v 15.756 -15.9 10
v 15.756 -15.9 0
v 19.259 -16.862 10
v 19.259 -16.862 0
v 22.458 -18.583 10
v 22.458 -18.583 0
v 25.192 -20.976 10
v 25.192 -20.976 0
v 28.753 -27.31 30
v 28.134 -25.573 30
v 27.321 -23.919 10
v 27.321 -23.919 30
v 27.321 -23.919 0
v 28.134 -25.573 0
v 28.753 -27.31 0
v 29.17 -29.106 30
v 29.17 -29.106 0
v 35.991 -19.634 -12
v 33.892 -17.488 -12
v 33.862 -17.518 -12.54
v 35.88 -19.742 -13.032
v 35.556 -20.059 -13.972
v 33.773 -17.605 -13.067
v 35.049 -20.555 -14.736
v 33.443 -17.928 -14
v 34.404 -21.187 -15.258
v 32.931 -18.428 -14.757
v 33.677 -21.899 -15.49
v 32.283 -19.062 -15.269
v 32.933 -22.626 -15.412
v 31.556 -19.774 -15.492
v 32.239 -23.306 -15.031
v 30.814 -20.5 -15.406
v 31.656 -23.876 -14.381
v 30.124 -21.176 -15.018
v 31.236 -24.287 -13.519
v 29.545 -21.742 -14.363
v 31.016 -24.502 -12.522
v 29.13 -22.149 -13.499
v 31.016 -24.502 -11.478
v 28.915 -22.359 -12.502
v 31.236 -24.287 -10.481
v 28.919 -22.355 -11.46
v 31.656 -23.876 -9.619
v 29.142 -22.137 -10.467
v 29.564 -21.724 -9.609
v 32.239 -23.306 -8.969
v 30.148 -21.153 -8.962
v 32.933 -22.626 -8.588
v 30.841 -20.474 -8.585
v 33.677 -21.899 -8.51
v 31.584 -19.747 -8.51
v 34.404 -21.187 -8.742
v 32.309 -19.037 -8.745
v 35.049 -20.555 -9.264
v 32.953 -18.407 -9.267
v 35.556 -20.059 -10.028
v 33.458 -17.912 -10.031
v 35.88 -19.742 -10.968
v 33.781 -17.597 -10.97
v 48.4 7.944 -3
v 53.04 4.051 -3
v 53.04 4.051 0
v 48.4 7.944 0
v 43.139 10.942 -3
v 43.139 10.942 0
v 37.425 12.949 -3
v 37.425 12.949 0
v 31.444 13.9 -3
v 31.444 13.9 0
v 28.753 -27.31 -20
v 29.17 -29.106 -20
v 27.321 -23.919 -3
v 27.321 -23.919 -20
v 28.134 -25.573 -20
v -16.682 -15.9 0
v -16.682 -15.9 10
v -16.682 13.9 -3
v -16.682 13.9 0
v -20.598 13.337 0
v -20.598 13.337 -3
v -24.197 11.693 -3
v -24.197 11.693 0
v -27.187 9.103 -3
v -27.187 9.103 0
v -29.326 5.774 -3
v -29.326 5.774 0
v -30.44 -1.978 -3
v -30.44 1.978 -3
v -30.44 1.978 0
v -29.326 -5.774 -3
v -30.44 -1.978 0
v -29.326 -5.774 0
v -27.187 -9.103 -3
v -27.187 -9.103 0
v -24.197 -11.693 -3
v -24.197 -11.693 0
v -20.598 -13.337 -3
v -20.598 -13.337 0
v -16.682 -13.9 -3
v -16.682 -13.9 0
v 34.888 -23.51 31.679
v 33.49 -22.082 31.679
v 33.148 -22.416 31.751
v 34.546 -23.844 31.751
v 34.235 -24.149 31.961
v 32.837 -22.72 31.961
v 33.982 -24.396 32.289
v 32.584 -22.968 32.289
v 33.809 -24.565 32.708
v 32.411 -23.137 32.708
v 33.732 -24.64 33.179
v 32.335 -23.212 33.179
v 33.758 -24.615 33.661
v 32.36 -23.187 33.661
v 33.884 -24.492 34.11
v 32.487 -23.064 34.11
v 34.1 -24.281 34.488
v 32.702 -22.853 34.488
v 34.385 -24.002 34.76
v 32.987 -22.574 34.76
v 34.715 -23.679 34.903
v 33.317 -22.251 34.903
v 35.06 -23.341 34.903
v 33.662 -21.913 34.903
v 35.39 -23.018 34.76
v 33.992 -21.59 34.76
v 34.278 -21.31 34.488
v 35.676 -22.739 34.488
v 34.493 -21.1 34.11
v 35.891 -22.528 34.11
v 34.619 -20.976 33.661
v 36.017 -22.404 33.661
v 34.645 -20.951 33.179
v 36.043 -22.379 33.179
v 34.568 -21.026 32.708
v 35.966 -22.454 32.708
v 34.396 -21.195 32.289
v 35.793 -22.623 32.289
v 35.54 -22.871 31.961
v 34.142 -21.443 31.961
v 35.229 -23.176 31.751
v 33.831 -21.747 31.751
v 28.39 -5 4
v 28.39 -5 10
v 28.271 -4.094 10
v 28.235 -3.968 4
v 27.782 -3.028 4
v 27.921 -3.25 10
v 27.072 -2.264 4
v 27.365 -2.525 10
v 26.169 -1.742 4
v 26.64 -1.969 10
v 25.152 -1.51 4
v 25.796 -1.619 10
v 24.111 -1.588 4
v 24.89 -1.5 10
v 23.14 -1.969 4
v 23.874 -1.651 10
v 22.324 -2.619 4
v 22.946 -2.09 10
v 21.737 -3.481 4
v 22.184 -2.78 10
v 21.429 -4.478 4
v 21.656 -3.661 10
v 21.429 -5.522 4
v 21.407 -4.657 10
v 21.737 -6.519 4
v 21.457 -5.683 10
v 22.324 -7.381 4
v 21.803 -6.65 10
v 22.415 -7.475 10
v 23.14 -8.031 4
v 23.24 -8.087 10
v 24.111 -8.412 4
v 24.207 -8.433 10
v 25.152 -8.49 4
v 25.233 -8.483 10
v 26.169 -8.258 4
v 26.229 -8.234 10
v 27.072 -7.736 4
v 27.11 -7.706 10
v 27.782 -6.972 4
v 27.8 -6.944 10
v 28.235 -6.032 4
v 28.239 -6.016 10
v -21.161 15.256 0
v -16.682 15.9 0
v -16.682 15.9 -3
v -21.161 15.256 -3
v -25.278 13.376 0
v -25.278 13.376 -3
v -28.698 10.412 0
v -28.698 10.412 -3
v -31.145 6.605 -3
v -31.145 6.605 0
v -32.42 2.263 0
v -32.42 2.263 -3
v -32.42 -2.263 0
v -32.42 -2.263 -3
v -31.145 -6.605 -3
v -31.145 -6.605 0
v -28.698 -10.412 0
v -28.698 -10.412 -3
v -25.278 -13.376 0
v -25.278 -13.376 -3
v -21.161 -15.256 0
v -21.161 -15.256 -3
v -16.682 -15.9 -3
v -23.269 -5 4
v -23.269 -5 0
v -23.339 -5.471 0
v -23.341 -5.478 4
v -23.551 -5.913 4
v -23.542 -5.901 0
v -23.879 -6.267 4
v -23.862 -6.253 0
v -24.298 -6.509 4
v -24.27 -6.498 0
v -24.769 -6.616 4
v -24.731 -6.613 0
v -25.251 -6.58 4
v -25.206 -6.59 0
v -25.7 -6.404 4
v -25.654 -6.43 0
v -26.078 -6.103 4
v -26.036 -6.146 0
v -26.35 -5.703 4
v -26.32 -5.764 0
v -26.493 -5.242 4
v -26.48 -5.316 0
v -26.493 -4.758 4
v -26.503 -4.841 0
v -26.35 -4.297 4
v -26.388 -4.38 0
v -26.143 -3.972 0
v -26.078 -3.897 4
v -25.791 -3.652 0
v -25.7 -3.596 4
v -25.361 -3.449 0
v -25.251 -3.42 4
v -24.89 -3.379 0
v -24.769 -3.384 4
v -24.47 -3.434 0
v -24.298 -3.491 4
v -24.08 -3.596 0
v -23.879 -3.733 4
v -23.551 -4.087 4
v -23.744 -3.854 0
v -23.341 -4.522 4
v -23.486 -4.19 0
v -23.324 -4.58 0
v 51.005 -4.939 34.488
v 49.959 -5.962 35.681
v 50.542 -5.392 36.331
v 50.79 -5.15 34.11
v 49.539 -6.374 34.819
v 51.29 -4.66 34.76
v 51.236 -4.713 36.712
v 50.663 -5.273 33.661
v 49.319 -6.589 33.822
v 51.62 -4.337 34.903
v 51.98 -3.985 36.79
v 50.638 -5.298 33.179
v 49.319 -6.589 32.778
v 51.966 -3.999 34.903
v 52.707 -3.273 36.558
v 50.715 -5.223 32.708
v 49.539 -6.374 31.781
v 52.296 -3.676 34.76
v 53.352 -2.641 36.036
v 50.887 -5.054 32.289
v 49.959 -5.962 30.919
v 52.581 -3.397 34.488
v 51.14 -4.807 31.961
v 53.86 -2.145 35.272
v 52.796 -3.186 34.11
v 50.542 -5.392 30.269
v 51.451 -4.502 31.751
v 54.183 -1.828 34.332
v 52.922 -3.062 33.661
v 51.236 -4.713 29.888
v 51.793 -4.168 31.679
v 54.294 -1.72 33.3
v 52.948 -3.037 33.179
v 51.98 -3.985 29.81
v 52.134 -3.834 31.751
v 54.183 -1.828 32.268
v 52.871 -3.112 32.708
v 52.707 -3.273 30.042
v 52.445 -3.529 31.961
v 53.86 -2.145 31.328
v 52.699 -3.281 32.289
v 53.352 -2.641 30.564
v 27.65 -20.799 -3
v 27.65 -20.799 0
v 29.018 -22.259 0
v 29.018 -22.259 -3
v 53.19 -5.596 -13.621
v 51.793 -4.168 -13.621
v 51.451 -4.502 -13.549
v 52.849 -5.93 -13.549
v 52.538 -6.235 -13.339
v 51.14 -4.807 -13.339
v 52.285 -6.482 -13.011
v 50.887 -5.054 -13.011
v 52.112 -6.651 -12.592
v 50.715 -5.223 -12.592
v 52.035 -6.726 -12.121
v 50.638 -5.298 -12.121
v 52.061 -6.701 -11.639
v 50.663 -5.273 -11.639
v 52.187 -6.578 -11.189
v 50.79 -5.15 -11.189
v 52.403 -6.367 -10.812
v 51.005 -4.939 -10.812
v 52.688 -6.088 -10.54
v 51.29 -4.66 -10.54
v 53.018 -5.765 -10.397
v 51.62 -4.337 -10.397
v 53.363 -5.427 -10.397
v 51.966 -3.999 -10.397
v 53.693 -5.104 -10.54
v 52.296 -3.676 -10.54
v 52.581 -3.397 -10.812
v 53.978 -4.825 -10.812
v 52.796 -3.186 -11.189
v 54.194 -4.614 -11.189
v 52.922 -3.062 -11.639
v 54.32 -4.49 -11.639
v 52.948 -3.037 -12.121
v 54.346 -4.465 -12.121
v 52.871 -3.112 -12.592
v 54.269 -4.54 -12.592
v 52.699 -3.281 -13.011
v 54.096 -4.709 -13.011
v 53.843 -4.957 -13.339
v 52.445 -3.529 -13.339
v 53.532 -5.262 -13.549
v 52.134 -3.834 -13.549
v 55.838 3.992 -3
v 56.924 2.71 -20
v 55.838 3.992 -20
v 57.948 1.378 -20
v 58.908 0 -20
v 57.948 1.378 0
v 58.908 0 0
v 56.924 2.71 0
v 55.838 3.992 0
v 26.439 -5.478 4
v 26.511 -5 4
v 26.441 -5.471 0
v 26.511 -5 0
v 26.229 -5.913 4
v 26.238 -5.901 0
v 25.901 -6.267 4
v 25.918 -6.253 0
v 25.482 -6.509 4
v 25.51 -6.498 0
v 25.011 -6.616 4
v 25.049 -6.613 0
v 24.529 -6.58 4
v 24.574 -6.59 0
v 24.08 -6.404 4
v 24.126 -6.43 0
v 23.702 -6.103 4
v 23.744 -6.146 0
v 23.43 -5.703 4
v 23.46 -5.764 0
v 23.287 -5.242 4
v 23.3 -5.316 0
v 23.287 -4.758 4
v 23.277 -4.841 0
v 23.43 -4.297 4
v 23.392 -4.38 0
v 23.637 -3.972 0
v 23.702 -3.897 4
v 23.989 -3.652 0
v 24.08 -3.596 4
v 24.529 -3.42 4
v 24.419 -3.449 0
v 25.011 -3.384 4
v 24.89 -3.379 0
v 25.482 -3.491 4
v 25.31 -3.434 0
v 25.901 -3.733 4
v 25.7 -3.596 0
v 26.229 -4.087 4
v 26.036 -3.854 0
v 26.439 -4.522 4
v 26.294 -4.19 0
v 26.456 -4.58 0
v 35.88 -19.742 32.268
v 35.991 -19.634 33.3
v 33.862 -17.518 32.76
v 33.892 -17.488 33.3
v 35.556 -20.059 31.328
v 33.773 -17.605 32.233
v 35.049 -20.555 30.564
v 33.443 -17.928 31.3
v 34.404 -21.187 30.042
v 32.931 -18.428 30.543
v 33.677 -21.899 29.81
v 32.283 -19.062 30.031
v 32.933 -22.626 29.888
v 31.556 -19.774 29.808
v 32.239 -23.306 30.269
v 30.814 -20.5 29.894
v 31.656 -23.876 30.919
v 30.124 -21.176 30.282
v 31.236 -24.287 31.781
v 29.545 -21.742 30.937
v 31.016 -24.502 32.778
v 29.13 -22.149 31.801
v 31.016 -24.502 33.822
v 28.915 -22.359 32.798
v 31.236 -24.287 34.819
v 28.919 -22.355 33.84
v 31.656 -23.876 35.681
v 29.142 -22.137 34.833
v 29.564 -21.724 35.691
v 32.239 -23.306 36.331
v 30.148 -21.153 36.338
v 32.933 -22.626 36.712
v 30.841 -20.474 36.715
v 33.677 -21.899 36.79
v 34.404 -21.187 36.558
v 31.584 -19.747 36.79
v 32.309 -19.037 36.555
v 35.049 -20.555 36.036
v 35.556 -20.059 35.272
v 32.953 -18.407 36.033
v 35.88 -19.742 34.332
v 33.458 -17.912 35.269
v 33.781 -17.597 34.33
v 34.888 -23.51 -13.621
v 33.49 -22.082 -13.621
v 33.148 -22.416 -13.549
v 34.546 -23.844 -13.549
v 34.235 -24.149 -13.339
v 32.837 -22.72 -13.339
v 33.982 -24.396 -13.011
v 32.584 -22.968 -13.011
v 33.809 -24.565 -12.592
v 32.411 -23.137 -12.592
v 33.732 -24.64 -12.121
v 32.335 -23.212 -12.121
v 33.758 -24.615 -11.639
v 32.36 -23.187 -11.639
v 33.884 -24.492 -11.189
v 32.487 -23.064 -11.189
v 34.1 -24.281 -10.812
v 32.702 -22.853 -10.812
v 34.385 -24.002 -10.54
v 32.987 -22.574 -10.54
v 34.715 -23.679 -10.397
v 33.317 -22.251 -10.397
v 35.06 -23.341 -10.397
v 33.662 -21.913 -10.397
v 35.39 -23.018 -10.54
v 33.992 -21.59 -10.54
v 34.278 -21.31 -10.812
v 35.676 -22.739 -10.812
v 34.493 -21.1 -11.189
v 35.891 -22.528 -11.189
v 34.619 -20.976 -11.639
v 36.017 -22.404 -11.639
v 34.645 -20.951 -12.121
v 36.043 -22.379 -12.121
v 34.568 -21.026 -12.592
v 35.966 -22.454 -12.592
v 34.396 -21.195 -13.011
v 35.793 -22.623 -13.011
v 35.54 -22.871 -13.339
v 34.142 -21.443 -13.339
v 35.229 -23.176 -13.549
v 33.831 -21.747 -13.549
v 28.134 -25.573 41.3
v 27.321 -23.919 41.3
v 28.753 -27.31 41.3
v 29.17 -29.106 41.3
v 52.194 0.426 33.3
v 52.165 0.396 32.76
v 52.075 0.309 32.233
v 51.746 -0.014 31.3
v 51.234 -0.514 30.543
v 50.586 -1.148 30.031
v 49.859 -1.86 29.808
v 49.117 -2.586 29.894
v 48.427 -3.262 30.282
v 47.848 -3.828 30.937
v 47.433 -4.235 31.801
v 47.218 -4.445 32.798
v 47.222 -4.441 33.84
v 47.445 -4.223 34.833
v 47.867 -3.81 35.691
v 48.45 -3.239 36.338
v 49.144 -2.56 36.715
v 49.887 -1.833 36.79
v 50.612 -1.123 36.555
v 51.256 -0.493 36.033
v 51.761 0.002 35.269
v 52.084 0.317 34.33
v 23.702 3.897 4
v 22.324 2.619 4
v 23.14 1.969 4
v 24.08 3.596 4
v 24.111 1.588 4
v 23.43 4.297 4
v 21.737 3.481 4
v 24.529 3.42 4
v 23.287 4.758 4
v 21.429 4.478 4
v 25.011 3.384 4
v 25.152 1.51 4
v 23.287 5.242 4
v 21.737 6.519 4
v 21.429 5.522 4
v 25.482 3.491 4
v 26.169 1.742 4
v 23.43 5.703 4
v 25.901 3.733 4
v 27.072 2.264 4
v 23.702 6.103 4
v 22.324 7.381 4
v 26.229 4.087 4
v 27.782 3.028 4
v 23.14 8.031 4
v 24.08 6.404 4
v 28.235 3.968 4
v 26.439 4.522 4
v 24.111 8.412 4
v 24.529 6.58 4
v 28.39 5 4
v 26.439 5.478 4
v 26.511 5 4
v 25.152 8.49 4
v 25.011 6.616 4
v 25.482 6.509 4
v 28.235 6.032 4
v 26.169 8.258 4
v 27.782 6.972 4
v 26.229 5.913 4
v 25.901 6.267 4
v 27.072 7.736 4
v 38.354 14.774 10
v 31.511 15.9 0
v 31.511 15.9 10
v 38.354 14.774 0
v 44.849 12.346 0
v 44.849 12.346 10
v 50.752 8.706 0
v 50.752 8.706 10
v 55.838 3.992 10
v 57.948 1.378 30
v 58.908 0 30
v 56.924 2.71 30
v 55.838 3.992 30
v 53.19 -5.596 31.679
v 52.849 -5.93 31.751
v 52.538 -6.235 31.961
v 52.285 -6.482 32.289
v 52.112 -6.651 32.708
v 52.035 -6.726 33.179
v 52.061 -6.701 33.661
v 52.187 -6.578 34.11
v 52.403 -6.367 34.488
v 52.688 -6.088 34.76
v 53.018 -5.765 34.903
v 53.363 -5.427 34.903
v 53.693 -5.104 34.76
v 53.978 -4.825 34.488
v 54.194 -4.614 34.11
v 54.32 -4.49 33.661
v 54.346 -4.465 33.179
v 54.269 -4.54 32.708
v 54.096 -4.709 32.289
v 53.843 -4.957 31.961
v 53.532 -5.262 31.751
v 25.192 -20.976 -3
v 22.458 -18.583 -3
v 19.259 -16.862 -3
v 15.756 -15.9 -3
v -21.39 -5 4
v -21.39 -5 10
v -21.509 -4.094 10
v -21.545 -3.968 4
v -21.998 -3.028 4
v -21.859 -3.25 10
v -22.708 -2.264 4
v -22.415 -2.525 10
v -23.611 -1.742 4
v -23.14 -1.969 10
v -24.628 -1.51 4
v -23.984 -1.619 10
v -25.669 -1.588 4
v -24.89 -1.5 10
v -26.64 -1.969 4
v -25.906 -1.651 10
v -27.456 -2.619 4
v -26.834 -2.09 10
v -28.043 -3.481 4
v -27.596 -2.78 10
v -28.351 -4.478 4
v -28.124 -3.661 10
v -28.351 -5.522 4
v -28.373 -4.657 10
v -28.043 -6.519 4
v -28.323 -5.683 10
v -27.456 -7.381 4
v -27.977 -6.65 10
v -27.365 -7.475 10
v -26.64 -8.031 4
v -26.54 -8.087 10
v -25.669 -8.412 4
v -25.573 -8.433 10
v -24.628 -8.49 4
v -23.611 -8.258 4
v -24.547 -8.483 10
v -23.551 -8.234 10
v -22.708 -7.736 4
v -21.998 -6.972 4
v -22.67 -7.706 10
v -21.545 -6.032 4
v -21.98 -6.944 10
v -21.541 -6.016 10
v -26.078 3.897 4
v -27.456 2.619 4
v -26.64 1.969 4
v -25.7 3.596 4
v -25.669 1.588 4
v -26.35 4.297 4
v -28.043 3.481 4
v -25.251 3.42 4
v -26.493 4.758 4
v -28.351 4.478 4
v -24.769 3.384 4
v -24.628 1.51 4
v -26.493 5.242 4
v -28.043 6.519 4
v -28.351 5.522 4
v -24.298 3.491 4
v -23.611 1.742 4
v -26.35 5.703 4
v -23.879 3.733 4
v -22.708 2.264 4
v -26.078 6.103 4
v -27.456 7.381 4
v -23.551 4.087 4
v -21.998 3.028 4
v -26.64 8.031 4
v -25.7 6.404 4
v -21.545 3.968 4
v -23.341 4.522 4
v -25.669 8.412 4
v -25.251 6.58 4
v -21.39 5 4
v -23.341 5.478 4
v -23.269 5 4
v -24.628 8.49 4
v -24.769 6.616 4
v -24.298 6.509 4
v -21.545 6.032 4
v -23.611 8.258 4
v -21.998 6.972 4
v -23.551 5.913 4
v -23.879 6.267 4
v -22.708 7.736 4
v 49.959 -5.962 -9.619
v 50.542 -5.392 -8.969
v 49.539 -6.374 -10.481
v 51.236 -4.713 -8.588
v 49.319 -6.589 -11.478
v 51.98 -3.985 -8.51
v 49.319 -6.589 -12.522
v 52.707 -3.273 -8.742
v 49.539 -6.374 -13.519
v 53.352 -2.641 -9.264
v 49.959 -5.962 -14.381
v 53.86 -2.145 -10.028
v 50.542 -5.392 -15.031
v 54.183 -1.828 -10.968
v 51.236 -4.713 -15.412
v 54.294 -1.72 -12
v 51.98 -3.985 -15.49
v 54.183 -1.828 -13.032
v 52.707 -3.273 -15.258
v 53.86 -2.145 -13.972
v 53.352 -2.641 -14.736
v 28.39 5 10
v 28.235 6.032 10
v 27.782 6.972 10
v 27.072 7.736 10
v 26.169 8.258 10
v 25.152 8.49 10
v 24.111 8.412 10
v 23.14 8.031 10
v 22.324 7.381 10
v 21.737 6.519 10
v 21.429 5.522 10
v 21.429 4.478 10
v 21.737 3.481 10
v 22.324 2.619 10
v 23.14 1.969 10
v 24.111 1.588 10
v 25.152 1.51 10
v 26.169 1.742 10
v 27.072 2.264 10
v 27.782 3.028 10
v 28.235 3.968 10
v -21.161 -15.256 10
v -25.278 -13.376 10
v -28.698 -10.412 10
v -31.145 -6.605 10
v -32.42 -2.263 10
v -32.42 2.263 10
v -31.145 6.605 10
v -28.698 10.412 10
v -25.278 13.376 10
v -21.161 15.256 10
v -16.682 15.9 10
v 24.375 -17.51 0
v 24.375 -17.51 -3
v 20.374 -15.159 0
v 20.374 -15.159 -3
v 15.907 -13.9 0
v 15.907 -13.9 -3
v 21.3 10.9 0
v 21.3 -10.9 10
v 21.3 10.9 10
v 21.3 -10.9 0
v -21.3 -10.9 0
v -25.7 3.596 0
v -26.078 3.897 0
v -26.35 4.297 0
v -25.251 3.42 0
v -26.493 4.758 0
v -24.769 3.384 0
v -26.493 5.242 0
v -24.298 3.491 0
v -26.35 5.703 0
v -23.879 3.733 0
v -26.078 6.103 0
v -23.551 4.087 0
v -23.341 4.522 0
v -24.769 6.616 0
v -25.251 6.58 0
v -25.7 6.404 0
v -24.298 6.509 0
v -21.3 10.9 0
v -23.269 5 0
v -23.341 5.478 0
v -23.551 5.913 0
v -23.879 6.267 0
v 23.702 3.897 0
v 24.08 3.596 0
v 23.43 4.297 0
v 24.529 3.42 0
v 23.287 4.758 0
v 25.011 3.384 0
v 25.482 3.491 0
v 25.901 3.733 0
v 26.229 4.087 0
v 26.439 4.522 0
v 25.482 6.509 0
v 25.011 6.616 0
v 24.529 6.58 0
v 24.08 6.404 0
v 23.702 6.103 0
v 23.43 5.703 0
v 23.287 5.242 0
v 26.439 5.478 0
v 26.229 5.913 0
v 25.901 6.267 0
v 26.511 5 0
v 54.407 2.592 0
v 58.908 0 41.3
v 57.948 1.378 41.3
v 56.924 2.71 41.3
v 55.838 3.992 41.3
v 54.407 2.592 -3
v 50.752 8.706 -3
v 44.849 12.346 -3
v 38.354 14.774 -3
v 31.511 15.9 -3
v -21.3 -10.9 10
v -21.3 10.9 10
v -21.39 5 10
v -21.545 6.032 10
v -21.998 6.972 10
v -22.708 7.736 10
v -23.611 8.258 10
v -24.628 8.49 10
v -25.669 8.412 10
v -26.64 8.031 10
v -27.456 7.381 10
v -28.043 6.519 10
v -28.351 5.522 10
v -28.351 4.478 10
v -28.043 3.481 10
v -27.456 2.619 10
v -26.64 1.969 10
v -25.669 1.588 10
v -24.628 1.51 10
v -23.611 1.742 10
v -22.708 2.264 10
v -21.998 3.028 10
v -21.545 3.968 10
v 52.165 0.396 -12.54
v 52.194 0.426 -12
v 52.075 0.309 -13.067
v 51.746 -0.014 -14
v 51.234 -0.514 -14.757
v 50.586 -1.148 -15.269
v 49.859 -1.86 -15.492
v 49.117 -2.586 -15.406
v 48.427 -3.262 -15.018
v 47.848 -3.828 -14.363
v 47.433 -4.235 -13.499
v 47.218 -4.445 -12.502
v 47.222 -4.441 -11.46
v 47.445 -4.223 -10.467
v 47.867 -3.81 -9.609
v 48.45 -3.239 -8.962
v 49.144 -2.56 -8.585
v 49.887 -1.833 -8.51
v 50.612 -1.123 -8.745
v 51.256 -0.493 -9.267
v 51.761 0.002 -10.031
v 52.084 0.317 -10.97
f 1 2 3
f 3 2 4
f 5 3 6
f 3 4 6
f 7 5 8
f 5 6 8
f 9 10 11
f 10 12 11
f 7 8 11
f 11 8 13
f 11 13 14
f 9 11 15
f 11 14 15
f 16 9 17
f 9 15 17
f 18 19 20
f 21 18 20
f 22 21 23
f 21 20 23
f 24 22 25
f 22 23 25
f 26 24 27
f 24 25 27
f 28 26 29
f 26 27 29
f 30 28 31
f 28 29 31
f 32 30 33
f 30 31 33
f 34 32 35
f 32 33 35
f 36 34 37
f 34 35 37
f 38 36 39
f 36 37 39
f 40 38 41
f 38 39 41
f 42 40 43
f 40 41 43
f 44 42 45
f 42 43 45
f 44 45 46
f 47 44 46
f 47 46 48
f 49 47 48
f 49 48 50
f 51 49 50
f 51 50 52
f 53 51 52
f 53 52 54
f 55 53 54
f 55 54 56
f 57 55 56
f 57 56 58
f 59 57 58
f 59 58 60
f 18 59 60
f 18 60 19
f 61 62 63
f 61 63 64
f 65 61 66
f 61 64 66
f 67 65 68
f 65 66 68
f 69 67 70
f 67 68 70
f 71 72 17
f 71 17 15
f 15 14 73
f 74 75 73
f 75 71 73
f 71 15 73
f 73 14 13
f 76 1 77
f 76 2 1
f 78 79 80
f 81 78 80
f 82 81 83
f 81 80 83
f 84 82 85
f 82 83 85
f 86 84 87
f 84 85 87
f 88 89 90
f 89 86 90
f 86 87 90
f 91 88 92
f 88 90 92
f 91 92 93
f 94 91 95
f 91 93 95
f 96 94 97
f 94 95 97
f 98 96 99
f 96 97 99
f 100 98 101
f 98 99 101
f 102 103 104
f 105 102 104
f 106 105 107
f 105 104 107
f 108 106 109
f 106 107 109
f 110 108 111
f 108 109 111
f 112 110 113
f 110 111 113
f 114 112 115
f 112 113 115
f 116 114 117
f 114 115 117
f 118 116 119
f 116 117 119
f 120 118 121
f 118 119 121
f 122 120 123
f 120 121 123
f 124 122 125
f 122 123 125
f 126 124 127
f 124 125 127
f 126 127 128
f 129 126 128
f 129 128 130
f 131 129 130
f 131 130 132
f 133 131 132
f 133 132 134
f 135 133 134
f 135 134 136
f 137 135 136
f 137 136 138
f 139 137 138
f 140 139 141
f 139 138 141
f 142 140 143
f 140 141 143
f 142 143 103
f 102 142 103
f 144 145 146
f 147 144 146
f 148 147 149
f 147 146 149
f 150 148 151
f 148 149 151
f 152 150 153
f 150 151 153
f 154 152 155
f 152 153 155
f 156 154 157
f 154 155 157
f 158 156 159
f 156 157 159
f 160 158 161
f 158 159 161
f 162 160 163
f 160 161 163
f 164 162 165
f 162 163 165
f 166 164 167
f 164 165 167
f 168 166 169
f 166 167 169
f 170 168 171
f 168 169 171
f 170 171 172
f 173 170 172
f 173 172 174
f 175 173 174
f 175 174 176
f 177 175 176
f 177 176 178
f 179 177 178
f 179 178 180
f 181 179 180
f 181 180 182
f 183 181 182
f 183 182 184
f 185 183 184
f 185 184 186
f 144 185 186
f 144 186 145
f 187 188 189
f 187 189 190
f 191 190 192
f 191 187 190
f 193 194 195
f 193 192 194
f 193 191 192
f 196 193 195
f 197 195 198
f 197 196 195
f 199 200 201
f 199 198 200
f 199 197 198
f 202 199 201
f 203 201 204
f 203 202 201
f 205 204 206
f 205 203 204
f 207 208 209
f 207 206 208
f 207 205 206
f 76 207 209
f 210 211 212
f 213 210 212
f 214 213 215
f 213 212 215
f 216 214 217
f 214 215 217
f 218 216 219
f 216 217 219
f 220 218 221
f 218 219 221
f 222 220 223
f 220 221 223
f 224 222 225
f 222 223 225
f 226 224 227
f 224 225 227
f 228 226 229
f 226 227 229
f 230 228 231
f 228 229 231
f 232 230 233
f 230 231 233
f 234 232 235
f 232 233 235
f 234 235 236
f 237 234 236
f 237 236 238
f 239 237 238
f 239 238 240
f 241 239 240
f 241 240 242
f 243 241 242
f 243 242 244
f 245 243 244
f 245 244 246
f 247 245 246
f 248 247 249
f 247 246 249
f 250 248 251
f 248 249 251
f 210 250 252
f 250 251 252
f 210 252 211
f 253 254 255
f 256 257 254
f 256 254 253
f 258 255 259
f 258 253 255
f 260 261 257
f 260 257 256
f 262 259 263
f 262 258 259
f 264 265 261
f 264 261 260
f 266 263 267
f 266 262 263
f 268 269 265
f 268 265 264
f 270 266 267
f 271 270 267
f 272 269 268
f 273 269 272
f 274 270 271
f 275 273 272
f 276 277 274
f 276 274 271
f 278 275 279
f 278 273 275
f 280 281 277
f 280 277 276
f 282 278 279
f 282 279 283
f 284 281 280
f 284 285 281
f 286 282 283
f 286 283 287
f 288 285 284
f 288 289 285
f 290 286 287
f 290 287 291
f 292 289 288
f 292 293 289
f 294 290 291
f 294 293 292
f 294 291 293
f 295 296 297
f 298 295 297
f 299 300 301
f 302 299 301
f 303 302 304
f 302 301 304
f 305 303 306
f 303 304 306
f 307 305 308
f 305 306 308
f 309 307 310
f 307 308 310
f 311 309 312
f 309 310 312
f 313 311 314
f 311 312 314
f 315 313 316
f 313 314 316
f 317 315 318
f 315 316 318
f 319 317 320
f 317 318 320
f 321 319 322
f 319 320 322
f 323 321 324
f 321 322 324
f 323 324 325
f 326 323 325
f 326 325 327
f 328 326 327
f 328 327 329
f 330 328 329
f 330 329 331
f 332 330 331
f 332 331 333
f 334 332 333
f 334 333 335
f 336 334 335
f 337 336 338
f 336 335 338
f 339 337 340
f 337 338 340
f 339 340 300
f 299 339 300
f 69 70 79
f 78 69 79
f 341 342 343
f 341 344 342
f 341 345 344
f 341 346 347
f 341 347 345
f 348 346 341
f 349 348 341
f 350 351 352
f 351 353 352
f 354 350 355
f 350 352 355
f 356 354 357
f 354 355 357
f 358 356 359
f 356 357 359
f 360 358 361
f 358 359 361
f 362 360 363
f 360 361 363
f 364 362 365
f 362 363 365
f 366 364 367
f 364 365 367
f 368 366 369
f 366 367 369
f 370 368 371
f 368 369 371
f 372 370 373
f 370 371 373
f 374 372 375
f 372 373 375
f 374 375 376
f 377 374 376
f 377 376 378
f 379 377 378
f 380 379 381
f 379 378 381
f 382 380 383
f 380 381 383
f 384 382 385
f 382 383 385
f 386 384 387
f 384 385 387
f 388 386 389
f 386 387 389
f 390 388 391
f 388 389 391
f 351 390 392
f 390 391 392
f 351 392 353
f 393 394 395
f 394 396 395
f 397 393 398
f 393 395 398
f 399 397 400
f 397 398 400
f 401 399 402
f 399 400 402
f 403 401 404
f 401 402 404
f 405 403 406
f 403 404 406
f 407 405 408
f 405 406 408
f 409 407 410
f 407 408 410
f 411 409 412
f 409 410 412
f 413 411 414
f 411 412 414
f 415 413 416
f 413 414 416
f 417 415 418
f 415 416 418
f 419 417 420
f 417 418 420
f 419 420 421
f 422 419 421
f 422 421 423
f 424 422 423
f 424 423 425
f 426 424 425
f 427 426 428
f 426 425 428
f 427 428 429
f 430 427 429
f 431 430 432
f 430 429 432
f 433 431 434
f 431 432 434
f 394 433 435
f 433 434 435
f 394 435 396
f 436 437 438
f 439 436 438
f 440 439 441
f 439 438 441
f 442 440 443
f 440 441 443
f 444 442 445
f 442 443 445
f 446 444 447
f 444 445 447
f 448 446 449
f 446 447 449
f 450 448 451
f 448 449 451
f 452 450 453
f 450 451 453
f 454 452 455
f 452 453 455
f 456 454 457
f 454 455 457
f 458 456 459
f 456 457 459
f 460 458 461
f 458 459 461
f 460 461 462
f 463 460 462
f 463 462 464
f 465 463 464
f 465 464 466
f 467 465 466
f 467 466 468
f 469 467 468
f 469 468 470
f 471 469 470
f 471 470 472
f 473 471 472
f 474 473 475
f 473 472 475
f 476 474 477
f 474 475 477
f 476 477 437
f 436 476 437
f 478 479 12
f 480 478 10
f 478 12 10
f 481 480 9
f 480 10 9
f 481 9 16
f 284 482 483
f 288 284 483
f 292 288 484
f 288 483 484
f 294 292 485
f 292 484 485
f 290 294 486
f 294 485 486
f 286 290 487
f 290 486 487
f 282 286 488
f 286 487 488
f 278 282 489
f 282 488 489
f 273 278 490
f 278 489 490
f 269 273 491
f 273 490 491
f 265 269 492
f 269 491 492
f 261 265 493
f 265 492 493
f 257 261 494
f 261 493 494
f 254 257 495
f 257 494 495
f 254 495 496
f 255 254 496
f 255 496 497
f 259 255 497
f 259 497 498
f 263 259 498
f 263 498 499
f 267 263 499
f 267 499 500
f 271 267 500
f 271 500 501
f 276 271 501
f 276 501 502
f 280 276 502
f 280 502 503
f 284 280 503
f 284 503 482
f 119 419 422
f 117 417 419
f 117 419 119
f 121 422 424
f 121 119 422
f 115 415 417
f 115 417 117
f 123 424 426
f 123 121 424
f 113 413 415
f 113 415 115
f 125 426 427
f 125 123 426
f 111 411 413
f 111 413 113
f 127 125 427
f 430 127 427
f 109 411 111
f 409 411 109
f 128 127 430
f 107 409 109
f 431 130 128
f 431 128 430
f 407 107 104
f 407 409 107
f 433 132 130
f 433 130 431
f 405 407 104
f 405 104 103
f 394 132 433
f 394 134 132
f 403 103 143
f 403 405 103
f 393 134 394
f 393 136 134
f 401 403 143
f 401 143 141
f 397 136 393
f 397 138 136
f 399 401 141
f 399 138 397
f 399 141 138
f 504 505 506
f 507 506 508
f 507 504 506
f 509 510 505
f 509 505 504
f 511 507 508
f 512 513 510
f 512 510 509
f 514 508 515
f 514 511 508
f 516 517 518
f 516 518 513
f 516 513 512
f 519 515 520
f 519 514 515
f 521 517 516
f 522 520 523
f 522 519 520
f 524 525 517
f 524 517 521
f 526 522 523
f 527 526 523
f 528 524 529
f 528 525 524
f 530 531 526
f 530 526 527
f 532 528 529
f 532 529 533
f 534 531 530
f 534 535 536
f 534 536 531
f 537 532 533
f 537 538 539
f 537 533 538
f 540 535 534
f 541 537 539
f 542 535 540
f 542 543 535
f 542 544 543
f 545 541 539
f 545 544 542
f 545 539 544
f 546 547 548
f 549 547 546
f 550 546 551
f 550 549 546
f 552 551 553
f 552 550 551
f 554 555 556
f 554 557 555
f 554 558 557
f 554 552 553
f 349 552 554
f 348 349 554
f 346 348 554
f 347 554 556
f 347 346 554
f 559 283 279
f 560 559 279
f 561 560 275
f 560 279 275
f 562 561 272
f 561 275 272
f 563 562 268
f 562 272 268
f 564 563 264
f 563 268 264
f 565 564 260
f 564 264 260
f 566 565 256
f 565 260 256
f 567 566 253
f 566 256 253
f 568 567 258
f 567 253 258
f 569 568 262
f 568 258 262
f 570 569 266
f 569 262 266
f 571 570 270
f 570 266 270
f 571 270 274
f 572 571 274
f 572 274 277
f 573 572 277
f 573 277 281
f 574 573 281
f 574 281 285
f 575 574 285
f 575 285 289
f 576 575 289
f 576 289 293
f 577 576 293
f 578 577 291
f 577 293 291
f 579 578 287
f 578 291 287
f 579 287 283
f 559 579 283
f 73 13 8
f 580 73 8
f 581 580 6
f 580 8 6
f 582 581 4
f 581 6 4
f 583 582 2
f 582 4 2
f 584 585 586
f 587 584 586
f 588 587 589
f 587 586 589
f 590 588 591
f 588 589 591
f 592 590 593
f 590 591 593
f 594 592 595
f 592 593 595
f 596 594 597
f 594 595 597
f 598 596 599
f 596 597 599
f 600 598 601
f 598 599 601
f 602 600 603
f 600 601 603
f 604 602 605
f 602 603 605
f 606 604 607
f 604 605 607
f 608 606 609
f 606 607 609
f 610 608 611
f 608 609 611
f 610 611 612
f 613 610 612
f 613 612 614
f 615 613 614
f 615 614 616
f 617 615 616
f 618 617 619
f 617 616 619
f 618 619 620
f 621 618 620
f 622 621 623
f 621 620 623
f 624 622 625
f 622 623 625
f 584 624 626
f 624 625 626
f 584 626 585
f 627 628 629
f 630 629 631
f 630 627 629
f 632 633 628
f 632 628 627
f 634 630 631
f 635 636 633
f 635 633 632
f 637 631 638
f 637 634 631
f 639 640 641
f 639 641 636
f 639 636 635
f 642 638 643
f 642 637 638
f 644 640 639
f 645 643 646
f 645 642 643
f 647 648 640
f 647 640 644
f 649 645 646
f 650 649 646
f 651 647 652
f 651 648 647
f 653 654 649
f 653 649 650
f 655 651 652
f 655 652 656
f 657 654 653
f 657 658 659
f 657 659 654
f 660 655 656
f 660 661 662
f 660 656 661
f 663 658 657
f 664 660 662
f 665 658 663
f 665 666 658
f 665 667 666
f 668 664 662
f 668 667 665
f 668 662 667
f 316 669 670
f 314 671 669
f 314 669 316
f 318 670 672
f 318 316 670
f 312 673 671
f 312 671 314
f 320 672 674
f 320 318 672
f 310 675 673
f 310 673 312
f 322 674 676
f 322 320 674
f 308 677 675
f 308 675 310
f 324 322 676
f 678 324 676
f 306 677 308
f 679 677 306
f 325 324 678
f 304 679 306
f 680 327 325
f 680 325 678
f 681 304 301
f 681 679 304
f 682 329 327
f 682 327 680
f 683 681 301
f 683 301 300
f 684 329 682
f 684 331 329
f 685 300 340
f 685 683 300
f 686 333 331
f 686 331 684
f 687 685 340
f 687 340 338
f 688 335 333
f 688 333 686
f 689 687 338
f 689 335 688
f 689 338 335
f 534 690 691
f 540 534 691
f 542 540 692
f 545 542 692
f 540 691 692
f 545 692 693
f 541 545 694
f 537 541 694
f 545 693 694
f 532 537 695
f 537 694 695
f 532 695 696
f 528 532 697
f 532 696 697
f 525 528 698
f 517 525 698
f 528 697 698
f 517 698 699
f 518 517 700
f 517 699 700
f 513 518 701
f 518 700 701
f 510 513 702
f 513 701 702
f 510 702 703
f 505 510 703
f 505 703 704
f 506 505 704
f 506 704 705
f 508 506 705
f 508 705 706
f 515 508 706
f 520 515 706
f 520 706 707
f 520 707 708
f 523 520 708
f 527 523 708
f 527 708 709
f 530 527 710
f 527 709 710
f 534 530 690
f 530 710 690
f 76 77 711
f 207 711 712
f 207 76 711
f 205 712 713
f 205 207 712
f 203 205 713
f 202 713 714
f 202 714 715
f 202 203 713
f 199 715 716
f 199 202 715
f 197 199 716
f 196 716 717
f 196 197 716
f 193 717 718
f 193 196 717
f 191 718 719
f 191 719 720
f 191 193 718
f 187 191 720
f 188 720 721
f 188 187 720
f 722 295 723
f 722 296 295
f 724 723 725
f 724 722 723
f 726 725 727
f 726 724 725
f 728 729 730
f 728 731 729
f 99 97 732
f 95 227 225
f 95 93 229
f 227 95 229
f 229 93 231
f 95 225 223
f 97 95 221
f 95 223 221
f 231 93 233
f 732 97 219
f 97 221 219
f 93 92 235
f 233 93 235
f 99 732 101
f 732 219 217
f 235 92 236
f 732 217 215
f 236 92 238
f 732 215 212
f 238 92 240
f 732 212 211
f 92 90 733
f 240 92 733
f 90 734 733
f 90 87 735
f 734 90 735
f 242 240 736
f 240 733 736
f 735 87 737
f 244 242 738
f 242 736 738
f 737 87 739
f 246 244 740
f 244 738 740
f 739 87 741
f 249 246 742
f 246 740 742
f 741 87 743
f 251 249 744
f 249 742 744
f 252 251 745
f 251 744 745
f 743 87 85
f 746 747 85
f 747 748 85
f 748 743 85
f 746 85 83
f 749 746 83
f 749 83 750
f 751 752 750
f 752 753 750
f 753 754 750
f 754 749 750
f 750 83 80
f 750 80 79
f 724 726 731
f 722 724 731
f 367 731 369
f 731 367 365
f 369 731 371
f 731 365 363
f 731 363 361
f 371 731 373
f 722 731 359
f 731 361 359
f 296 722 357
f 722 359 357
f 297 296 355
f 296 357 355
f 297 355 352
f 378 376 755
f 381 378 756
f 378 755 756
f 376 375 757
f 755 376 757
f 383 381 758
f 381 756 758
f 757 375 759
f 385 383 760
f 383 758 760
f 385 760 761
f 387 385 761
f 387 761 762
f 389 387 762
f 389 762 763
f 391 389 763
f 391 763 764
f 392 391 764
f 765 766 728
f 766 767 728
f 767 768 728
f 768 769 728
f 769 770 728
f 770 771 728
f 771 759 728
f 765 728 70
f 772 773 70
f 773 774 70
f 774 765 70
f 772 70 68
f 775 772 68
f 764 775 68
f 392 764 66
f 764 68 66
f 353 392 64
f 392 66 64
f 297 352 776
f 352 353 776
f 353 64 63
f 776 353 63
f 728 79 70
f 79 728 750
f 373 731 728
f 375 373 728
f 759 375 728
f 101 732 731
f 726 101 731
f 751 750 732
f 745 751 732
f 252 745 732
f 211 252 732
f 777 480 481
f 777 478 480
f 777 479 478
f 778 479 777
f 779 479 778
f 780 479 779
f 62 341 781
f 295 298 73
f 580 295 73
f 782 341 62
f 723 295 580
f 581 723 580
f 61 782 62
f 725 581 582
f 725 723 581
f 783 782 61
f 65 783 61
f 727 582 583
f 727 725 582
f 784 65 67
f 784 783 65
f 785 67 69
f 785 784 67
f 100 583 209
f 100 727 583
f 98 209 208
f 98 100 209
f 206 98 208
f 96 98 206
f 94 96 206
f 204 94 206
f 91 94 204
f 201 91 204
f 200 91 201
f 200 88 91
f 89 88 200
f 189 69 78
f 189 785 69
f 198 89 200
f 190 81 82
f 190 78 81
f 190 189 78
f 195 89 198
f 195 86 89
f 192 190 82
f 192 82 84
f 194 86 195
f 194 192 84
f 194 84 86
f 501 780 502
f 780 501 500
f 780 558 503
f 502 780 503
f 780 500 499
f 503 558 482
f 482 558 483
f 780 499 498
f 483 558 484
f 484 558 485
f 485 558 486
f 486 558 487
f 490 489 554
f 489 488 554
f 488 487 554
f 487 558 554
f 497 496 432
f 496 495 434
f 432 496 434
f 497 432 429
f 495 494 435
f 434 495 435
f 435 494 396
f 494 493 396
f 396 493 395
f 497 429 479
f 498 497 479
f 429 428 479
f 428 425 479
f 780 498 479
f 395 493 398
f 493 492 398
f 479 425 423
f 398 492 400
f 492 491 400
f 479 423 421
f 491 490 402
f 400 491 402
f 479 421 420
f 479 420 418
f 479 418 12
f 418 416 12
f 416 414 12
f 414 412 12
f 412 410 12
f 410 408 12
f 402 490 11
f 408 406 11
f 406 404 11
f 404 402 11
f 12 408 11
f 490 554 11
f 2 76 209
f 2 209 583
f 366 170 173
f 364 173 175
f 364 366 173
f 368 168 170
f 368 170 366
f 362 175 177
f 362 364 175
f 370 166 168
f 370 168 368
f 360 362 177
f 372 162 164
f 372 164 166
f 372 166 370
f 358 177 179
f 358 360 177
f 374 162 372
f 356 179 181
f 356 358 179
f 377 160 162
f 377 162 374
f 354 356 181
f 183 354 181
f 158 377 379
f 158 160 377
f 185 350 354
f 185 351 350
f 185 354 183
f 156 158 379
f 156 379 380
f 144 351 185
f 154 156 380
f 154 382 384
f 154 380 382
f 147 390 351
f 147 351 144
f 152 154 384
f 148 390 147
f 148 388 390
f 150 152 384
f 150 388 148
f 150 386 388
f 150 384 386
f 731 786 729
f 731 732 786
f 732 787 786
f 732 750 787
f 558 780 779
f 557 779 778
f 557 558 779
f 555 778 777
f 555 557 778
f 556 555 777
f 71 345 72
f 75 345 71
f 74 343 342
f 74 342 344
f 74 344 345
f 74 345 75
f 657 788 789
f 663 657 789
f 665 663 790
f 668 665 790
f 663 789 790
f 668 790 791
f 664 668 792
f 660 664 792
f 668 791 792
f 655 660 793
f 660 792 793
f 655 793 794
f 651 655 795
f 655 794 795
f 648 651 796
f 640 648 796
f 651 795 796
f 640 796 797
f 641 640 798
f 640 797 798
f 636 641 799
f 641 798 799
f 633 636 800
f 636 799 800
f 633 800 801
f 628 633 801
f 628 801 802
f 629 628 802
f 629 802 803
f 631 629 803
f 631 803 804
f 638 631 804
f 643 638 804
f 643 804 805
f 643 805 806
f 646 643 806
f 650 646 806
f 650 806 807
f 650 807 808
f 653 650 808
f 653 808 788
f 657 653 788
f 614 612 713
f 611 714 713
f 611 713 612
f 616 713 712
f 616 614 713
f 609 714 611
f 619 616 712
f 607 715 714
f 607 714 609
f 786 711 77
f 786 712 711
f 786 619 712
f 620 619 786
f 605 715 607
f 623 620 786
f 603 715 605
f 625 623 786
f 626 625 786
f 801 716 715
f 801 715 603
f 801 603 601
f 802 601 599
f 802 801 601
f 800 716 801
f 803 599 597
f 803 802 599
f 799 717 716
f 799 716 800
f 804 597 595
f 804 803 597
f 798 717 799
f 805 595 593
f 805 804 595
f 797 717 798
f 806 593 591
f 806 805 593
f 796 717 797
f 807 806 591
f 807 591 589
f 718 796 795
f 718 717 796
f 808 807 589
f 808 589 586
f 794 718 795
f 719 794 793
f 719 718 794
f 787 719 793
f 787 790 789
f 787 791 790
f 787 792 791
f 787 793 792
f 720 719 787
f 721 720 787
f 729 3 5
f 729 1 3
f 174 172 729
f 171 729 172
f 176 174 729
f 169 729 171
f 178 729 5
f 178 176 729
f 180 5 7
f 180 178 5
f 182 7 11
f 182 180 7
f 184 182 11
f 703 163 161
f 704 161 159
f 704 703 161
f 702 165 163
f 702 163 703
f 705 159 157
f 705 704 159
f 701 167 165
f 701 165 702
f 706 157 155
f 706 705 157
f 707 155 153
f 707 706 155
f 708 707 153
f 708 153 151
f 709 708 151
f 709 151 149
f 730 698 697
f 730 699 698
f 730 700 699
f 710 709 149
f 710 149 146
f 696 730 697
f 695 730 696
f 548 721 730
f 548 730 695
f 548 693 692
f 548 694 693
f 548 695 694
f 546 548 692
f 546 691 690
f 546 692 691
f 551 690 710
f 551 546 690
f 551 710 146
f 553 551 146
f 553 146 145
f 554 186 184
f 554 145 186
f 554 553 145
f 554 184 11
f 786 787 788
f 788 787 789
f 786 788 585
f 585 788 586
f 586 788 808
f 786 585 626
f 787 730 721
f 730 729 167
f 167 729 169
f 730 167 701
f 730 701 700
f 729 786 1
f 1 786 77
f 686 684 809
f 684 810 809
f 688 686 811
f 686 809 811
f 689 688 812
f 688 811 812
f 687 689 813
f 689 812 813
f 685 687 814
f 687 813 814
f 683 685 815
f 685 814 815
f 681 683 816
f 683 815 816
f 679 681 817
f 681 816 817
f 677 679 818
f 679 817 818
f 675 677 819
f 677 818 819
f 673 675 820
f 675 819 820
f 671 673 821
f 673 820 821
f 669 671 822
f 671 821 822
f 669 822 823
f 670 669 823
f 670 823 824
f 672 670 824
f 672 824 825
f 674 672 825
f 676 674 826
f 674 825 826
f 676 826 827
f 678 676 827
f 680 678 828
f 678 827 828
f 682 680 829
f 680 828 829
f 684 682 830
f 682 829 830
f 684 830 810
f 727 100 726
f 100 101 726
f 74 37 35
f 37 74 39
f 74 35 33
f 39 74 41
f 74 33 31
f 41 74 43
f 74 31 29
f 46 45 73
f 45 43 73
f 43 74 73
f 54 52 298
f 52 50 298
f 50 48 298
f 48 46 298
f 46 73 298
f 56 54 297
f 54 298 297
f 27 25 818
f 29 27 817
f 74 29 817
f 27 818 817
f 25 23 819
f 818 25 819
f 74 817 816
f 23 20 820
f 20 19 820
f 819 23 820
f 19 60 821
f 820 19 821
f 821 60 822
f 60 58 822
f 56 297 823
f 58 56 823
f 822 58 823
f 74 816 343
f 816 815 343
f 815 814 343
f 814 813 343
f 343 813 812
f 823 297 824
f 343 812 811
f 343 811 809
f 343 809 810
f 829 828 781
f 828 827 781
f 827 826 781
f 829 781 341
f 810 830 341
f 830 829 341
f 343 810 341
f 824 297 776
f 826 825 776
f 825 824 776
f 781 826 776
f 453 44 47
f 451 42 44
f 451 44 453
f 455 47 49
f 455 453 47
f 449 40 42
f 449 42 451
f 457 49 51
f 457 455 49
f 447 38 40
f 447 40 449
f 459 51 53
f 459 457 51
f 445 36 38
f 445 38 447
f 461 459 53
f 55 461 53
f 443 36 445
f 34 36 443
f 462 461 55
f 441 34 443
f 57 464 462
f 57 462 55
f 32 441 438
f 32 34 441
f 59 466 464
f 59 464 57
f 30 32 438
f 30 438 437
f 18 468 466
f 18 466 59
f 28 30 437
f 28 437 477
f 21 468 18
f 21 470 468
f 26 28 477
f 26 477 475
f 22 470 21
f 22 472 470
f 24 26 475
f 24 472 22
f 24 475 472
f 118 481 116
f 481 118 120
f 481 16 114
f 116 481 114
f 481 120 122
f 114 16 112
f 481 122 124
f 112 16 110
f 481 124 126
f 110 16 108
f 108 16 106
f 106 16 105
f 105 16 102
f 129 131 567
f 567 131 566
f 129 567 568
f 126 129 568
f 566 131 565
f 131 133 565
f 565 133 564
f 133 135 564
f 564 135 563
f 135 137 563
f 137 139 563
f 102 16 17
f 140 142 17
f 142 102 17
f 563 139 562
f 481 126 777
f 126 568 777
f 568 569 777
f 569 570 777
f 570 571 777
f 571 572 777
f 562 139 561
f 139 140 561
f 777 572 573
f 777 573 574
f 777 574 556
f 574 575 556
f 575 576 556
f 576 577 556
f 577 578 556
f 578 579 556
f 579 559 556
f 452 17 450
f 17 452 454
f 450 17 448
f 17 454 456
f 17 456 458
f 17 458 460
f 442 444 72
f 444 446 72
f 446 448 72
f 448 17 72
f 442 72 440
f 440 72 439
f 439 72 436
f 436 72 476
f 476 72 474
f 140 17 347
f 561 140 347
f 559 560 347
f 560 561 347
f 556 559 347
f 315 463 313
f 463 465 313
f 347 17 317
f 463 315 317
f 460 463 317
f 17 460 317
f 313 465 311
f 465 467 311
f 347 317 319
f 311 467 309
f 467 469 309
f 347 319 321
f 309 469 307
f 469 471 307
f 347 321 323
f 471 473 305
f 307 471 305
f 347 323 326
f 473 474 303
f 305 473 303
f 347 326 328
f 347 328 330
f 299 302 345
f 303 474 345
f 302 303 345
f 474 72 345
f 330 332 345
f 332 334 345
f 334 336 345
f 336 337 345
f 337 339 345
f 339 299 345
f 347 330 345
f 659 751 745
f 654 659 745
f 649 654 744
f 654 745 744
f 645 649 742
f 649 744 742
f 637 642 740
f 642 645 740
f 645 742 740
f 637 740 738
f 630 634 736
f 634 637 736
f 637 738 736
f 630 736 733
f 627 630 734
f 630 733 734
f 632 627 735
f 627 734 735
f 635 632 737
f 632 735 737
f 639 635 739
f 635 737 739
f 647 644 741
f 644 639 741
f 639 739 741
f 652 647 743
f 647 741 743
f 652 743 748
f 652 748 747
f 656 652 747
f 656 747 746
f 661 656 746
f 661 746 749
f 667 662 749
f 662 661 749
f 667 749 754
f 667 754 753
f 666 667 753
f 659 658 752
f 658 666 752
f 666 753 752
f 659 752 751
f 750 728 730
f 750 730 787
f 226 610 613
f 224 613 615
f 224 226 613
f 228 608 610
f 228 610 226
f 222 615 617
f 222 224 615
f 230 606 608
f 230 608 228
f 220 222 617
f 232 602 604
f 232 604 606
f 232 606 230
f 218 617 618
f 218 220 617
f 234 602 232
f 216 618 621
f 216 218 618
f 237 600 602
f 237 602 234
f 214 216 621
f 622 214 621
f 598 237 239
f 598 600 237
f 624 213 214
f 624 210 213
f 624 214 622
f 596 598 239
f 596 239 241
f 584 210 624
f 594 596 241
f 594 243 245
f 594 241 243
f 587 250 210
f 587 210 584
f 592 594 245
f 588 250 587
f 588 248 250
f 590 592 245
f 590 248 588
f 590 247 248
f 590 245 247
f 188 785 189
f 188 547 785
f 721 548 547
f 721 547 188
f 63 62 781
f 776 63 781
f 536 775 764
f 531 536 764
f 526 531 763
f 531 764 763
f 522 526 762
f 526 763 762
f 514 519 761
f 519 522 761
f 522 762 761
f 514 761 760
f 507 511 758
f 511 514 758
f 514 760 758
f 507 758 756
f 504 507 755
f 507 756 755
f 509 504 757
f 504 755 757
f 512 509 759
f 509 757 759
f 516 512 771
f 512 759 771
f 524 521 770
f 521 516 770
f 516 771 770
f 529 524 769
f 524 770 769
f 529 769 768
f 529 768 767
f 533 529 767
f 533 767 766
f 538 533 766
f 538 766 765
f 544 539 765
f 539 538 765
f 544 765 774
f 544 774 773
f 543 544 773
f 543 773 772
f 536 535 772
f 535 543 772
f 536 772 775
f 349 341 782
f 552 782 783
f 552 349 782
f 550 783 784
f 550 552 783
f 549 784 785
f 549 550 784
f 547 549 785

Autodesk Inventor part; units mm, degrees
ref_plane "YZ Plane" through (0, 0, 0) normal (1, 0, 0) x (0, 1, 0)
ref_plane "XZ Plane" through (0, 0, 0) normal (0, 1, 0) x (-1, 0, 0)
ref_plane "XY Plane" through (0, 0, 0) normal (0, 0, 1) x (1, 0, 0)
sketch "Szkic1" plane through (0, 0, 0) normal (0, 0, 1) x (1, 0, 0)
  line L0 (20.3, -9.9) -> (-20.3, -9.9)
  line L1 (-20.3, -9.9) -> (-20.3, 9.9)
  line L2 (-20.3, 9.9) -> (20.3, 9.9)
  line L3 (20.3, 9.9) -> (20.3, -9.9)
  line L4 (20.3, -9.9) -> (-20.3, 9.9) construction
  line L5 (-20.3, -9.9) -> (20.3, 9.9) construction
  line L6 (21.3, 10.9) -> (-21.3, 10.9)
  line L7 (-21.3, 10.9) -> (-21.3, -10.9)
  line L8 (-21.3, -10.9) -> (21.3, -10.9)
  line L9 (21.3, -10.9) -> (21.3, 10.9)
  line L10 (0, 0) -> (24.89, 0)
  line L11 (24.89, 0) -> (24.89, 5)
  line L12 (24.89, 5) -> (24.89, -5)
  line L13 (0, 0) -> (-24.89, 0)
  line L14 (-24.89, 5) -> (-24.89, 0)
  line L15 (-24.89, 0) -> (-24.89, -5)
  circle A0 centre (-24.89, 5) radius 1.621
  circle A1 centre (-24.89, -5) radius 1.621
  circle A2 centre (24.89, -5) radius 1.621
  circle A3 centre (24.89, 5) radius 1.621
  line L16 (-26.511, 5) -> (-31.511, 5)
  line L17 (26.511, 5) -> (31.511, 5)
  line L18 (0, 10.9) -> (0, 15.9)
  line L19 (0, 15.9) -> (-16.6819, 15.9)
  line L20 (0, -10.9) -> (0, -15.9)
  line L21 (0, -15.9) -> (-16.6819, -15.9)
  line L22 (-31.511, -5.7364) -> (-31.511, 5.7364)
  line L23 (0, 15.9) -> (31.511, 15.9)
  line L24 (31.511, 15.9) -> (31.511, -15.9)
  line L25 (0, -15.9) -> (31.511, -15.9)
  arc A4 (58.9078, 0) -> (31.511, 15.9) centre (29.1703, -19.6864) ccw
  arc A5 (29.1703, -29.1056) -> (15.7555, -15.9) centre (13.2559, -31.8556) ccw
  line L26 (29.1703, -29.1056) -> (58.9078, 0)
  circle A6 centre (-16.6819, 0) radius 15.9
  arc A7 (-32.5353, -15.867) -> (-31.511, -15.9) centre (-31.511, 0) ccw
  point P0 (58.9078, 0)
  dimension "d10" = 3.242
  dimension "d13" = 3.242
  dimension "d0" = 40.6
  dimension "d1" = 19.8
  dimension "d2" = 1
  dimension "d3" = 42.6
  dimension "d4" = 24.89
  dimension "d5" = 5
  dimension "d6" = 10
  dimension "d7" = 24.89
  dimension "d8" = 5
  dimension "d9" = 5
  dimension "d11" = 3.242
  dimension "d12" = 3.242
  dimension "d14" = 5
  dimension "d15" = 5
  dimension "d16" = 5
  dimension "d17" = 5
  dimension "d18" = 6.621
  dimension "d19" = 63.022
  dimension "d20" = 10.9
  dimension "d21" = 0
extrude "Wyciągnięcie proste1" add sketch "Szkic1" along normal blind 10 contours A6 L22 L16 A0 L14 L13 L7 L8 | L8 L20 L21 A6 | L10 L11 A3 L17 L24 L25 L20 L8 L9 | L9 L6 L18 L23 L24 L17 A3 L11 L10 | L13 L14 A0 L16 L22 A6 L6 L7 | A6 L22 | A6 L19 L18 L6 | L25 L24 A4 L26 A5
sketch "Szkic2" plane through (0, 0, 10) normal (0, 0, 1) x (1, 0, 0)
  arc A0 (29.1703, -29.1056) -> (15.7555, -15.9) centre (13.2559, -31.8556) ccw projected
  line L0 (29.1703, -29.1056) -> (58.9078, 0) projected
  arc A1 (58.9078, 0) -> (31.511, 15.9) centre (29.1703, -19.6864) ccw projected
  line L1 (29.1703, -29.1056) -> (58.9078, 0) projected
  arc A2 (29.1703, -29.1056) -> (15.7555, -15.9) centre (13.2559, -31.8556) ccw projected
  line L2 (27.3214, -23.9188) -> (55.8385, 3.9923)
  line L3 (31.511, 15.9) -> (-16.6819, 15.9) projected
  arc A3 (-16.6819, 15.9) -> (-16.6819, -15.9) centre (-16.6819, 0) ccw projected
  line L4 (-16.6819, -15.9) -> (15.7555, -15.9) projected
  point P0 (0, 0)
  dimension "d24" = 5
extrude "Wyciągnięcie proste2" add sketch "Szkic2" along normal blind 20 contours A0 L2 A1 L0
sketch "Szkic3" plane through (0, 0, 0) normal (0, 0, -1) x (-1, 0, 0)
  line L0 (-27.3214, -23.9188) -> (-55.8385, 3.9923) projected
  line L1 (-29.1703, -29.1056) -> (-58.9078, 0) projected
  arc A0 (-15.7555, -15.9) -> (-29.1703, -29.1056) centre (-13.2559, -31.8556) ccw projected
  arc A1 (-31.511, 15.9) -> (-58.9078, 0) centre (-29.1703, -19.6864) ccw projected
  line L2 (-29.1703, -29.1056) -> (-58.9078, 0) projected
  line L3 (16.6819, -15.9) -> (-15.7555, -15.9) projected
  arc A2 (16.6819, -15.9) -> (16.6819, 15.9) centre (16.6819, 0) ccw projected
  line L4 (-31.511, 15.9) -> (16.6819, 15.9) projected
  point P0 (0, 0)
  point P1 (-55.8385, 3.9923)
extrude "Wyciągnięcie proste3" add sketch "Szkic3" along normal blind 20 contours A0 L1 A1 L0
sketch "Szkic9" plane through (0, 0, 30) normal (0, 0, 1) x (1, 0, 0)
  arc A0 (29.1703, -29.1056) -> (27.3214, -23.9188) centre (13.2559, -31.8556) ccw projected
  line L0 (29.1703, -29.1056) -> (58.9078, 0) projected
  arc A1 (58.9078, 0) -> (55.8385, 3.9923) centre (29.1703, -19.6864) ccw projected
  line L1 (55.8385, 3.9923) -> (27.3214, -23.9188) projected
  point P0 (0, 0)
extrude "Wyciągnięcie proste5" add sketch "Szkic9" along normal blind 11.3
sketch "Szkic10" plane through (58.9078, 0, -20) normal (0.6995, -0.7147, 0) x (0.7147, 0.6995, 0)
  line L0 (-41.6107, 0) -> (-41.6107, 61.3) projected
  line L1 (0, 0) -> (-41.6107, 0) projected
  line L2 (0, 0) -> (0, 61.3) projected
  line L3 (-41.6107, 61.3) -> (0, 61.3) projected
  point P0 (-42.099, 20)
  point P1 (-33.6107, 8)
  point P2 (-8, 8)
  point P3 (-33.6107, 53.3)
  point P4 (-8, 53.3)
  dimension "d60" = 8
  dimension "d61" = 8
  dimension "d62" = 8
  dimension "d63" = 8
  dimension "d64" = 8
  dimension "d65" = 8
  dimension "d66" = 8
  dimension "d67" = 8
hole "Otwór2" at (34.8876, -23.5098, -12) at (53.1905, -5.5958, -12) at (34.8876, -23.5098, 33.3) at (53.1905, -5.5958, 33.3) direction (-0.6995, 0.7147, 0) diameter 3.242 end through all thread size "M4x0.7" designation "M4" class "6H" standard "GB Metric profile"
sketch "Szkic12" plane through (55.8385, 3.9923, 0) normal (-0.6995, 0.7147, 0) x (0.7147, 0.6995, 0)
  circle A0 centre (-34.2097, 12) radius 1.621 projected
  circle A1 centre (-8.599, 12) radius 1.621 projected
  line L0 (0, 0) -> (-39.9031, 0) projected
  line L1 (0, 0) -> (0, 20) projected
  line L2 (-39.9031, 20) -> (0, 20) projected
  line L3 (-39.9031, 0) -> (-39.9031, 20) projected
  circle A2 centre (-34.2097, -33.3) radius 1.621 projected
  circle A3 centre (-8.599, -33.3) radius 1.621 projected
  line L4 (-39.9031, -10) -> (0, -10) projected
  line L5 (-39.9031, -10) -> (-39.9031, -41.3) projected
  line L6 (0, -41.3) -> (-39.9031, -41.3) projected
  line L7 (0, -10) -> (0, -41.3) projected
  circle A4 centre (-8.599, 12) radius 1.621 projected
  circle A5 centre (-8.599, 12) radius 3.5
  circle A6 centre (-34.2097, 12) radius 3.5
  circle A7 centre (-34.2097, -33.3) radius 3.5
  circle A8 centre (-8.599, -33.3) radius 3.5
  point P0 (-42.698, 0)
  dimension "d77" = 7
  dimension "d78" = 7
  dimension "d79" = 7
  dimension "d80" = 7
extrude "Wyciągnięcie proste6" cut sketch "Szkic12" against normal blind 3 contours A0 | A1 | A2 | A3 | A5 | A6 | A7 | A8
sketch "Szkic15" plane through (0, 0, 0) normal (0, 0, -1) x (-1, 0, 0)
  line L0 (-55.8385, 3.9923) -> (-27.3214, -23.9188) projected
  arc A0 (-15.7555, -15.9) -> (-27.3214, -23.9188) centre (-13.2559, -31.8556) ccw projected
  line L1 (16.6819, -15.9) -> (-15.7555, -15.9) projected
  arc A1 (16.6819, -15.9) -> (16.6819, 15.9) centre (16.6819, 0) ccw projected
  line L2 (-31.511, 15.9) -> (16.6819, 15.9) projected
  arc A2 (-31.511, 15.9) -> (-55.8385, 3.9923) centre (-29.1703, -19.6864) ccw projected
  circle A3 centre (24.89, 5) radius 1.621 projected
  circle A4 centre (24.89, -5) radius 1.621 projected
  line L3 (-21.3, 10.9) -> (-21.3, -10.9) projected
  line L4 (21.3, 10.9) -> (-21.3, 10.9) projected
  line L5 (21.3, -10.9) -> (21.3, 10.9) projected
  line L6 (-21.3, -10.9) -> (21.3, -10.9) projected
  circle A5 centre (-24.89, -5) radius 1.621 projected
  circle A6 centre (-24.89, 5) radius 1.621 projected
  arc A7 (16.6819, -13.9) -> (16.6819, 13.9) centre (16.6819, 0) ccw
  line L7 (16.6819, -13.9) -> (-15.9066, -13.9)
  arc A8 (-15.9066, -13.9) -> (-27.6497, -20.799) centre (-13.2559, -31.8556) ccw
  line L8 (-27.6497, -20.799) -> (-53.0395, 4.0513)
  arc A9 (-31.4443, 13.9) -> (-53.0395, 4.0513) centre (-29.1703, -19.6864) ccw
  line L9 (-31.4443, 13.9) -> (16.6819, 13.9)
  line L10 (-53.0395, 4.0513) -> (-54.4074, 2.5916)
  line L11 (-55.8385, 3.9923) -> (-27.3214, -23.9188) projected
  line L12 (-27.6497, -20.799) -> (-29.0176, -22.2587)
  point P0 (0, 0)
  dimension "d86" = 2
extrude "Wyciągnięcie proste8" add sketch "Szkic15" along normal blind 3 contours A2 L2 A1 L1 A0 L0 L12 A8 L7 A7 L9 A9 L10
sketch "Szkic17" plane through (0, 0, 10) normal (0, 0, 1) x (1, 0, 0)
  line L0 (27.3214, -23.9188) -> (55.8385, 3.9923) projected
  arc A0 (55.8385, 3.9923) -> (31.511, 15.9) centre (29.1703, -19.6864) ccw projected
  line L1 (31.511, 15.9) -> (-16.6819, 15.9) projected
  arc A1 (-16.6819, 15.9) -> (-16.6819, -15.9) centre (-16.6819, 0) ccw projected
  line L2 (-16.6819, -15.9) -> (15.7555, -15.9) projected
  arc A2 (27.3214, -23.9188) -> (15.7555, -15.9) centre (13.2559, -31.8556) ccw projected
  circle A3 centre (-24.89, 5) radius 1.621 projected
  circle A4 centre (-24.89, -5) radius 1.621 projected
  line L3 (21.3, 10.9) -> (21.3, -10.9) projected
  line L4 (21.3, -10.9) -> (-21.3, -10.9) projected
  line L5 (-21.3, -10.9) -> (-21.3, 10.9) projected
  line L6 (-21.3, 10.9) -> (21.3, 10.9) projected
  circle A5 centre (24.89, -5) radius 1.621 projected
  circle A6 centre (24.89, 5) radius 1.621 projected
  circle A7 centre (-24.89, -5) radius 3.5
  circle A8 centre (-24.89, 5) radius 1.621 projected
  circle A9 centre (-24.89, 5) radius 3.5
  circle A10 centre (24.89, -5) radius 3.5
  circle A11 centre (24.89, 5) radius 3.5
  point P0 (0, 0)
  dimension "d89" = 7
  dimension "d90" = 7
  dimension "d91" = 7
  dimension "d92" = 7
extrude "Wyciągnięcie proste9" cut sketch "Szkic17" against normal blind 6 contours A7 | A9 | A10 | A11
equation "\"d13\" = d10"
equation "\"d11\" = d10"
equation "\"d12\" = d10"
equation "\"d62\" = d61"
equation "\"d63\" = d62"
properties part number "Ramie1_Drukowanie 3D"
